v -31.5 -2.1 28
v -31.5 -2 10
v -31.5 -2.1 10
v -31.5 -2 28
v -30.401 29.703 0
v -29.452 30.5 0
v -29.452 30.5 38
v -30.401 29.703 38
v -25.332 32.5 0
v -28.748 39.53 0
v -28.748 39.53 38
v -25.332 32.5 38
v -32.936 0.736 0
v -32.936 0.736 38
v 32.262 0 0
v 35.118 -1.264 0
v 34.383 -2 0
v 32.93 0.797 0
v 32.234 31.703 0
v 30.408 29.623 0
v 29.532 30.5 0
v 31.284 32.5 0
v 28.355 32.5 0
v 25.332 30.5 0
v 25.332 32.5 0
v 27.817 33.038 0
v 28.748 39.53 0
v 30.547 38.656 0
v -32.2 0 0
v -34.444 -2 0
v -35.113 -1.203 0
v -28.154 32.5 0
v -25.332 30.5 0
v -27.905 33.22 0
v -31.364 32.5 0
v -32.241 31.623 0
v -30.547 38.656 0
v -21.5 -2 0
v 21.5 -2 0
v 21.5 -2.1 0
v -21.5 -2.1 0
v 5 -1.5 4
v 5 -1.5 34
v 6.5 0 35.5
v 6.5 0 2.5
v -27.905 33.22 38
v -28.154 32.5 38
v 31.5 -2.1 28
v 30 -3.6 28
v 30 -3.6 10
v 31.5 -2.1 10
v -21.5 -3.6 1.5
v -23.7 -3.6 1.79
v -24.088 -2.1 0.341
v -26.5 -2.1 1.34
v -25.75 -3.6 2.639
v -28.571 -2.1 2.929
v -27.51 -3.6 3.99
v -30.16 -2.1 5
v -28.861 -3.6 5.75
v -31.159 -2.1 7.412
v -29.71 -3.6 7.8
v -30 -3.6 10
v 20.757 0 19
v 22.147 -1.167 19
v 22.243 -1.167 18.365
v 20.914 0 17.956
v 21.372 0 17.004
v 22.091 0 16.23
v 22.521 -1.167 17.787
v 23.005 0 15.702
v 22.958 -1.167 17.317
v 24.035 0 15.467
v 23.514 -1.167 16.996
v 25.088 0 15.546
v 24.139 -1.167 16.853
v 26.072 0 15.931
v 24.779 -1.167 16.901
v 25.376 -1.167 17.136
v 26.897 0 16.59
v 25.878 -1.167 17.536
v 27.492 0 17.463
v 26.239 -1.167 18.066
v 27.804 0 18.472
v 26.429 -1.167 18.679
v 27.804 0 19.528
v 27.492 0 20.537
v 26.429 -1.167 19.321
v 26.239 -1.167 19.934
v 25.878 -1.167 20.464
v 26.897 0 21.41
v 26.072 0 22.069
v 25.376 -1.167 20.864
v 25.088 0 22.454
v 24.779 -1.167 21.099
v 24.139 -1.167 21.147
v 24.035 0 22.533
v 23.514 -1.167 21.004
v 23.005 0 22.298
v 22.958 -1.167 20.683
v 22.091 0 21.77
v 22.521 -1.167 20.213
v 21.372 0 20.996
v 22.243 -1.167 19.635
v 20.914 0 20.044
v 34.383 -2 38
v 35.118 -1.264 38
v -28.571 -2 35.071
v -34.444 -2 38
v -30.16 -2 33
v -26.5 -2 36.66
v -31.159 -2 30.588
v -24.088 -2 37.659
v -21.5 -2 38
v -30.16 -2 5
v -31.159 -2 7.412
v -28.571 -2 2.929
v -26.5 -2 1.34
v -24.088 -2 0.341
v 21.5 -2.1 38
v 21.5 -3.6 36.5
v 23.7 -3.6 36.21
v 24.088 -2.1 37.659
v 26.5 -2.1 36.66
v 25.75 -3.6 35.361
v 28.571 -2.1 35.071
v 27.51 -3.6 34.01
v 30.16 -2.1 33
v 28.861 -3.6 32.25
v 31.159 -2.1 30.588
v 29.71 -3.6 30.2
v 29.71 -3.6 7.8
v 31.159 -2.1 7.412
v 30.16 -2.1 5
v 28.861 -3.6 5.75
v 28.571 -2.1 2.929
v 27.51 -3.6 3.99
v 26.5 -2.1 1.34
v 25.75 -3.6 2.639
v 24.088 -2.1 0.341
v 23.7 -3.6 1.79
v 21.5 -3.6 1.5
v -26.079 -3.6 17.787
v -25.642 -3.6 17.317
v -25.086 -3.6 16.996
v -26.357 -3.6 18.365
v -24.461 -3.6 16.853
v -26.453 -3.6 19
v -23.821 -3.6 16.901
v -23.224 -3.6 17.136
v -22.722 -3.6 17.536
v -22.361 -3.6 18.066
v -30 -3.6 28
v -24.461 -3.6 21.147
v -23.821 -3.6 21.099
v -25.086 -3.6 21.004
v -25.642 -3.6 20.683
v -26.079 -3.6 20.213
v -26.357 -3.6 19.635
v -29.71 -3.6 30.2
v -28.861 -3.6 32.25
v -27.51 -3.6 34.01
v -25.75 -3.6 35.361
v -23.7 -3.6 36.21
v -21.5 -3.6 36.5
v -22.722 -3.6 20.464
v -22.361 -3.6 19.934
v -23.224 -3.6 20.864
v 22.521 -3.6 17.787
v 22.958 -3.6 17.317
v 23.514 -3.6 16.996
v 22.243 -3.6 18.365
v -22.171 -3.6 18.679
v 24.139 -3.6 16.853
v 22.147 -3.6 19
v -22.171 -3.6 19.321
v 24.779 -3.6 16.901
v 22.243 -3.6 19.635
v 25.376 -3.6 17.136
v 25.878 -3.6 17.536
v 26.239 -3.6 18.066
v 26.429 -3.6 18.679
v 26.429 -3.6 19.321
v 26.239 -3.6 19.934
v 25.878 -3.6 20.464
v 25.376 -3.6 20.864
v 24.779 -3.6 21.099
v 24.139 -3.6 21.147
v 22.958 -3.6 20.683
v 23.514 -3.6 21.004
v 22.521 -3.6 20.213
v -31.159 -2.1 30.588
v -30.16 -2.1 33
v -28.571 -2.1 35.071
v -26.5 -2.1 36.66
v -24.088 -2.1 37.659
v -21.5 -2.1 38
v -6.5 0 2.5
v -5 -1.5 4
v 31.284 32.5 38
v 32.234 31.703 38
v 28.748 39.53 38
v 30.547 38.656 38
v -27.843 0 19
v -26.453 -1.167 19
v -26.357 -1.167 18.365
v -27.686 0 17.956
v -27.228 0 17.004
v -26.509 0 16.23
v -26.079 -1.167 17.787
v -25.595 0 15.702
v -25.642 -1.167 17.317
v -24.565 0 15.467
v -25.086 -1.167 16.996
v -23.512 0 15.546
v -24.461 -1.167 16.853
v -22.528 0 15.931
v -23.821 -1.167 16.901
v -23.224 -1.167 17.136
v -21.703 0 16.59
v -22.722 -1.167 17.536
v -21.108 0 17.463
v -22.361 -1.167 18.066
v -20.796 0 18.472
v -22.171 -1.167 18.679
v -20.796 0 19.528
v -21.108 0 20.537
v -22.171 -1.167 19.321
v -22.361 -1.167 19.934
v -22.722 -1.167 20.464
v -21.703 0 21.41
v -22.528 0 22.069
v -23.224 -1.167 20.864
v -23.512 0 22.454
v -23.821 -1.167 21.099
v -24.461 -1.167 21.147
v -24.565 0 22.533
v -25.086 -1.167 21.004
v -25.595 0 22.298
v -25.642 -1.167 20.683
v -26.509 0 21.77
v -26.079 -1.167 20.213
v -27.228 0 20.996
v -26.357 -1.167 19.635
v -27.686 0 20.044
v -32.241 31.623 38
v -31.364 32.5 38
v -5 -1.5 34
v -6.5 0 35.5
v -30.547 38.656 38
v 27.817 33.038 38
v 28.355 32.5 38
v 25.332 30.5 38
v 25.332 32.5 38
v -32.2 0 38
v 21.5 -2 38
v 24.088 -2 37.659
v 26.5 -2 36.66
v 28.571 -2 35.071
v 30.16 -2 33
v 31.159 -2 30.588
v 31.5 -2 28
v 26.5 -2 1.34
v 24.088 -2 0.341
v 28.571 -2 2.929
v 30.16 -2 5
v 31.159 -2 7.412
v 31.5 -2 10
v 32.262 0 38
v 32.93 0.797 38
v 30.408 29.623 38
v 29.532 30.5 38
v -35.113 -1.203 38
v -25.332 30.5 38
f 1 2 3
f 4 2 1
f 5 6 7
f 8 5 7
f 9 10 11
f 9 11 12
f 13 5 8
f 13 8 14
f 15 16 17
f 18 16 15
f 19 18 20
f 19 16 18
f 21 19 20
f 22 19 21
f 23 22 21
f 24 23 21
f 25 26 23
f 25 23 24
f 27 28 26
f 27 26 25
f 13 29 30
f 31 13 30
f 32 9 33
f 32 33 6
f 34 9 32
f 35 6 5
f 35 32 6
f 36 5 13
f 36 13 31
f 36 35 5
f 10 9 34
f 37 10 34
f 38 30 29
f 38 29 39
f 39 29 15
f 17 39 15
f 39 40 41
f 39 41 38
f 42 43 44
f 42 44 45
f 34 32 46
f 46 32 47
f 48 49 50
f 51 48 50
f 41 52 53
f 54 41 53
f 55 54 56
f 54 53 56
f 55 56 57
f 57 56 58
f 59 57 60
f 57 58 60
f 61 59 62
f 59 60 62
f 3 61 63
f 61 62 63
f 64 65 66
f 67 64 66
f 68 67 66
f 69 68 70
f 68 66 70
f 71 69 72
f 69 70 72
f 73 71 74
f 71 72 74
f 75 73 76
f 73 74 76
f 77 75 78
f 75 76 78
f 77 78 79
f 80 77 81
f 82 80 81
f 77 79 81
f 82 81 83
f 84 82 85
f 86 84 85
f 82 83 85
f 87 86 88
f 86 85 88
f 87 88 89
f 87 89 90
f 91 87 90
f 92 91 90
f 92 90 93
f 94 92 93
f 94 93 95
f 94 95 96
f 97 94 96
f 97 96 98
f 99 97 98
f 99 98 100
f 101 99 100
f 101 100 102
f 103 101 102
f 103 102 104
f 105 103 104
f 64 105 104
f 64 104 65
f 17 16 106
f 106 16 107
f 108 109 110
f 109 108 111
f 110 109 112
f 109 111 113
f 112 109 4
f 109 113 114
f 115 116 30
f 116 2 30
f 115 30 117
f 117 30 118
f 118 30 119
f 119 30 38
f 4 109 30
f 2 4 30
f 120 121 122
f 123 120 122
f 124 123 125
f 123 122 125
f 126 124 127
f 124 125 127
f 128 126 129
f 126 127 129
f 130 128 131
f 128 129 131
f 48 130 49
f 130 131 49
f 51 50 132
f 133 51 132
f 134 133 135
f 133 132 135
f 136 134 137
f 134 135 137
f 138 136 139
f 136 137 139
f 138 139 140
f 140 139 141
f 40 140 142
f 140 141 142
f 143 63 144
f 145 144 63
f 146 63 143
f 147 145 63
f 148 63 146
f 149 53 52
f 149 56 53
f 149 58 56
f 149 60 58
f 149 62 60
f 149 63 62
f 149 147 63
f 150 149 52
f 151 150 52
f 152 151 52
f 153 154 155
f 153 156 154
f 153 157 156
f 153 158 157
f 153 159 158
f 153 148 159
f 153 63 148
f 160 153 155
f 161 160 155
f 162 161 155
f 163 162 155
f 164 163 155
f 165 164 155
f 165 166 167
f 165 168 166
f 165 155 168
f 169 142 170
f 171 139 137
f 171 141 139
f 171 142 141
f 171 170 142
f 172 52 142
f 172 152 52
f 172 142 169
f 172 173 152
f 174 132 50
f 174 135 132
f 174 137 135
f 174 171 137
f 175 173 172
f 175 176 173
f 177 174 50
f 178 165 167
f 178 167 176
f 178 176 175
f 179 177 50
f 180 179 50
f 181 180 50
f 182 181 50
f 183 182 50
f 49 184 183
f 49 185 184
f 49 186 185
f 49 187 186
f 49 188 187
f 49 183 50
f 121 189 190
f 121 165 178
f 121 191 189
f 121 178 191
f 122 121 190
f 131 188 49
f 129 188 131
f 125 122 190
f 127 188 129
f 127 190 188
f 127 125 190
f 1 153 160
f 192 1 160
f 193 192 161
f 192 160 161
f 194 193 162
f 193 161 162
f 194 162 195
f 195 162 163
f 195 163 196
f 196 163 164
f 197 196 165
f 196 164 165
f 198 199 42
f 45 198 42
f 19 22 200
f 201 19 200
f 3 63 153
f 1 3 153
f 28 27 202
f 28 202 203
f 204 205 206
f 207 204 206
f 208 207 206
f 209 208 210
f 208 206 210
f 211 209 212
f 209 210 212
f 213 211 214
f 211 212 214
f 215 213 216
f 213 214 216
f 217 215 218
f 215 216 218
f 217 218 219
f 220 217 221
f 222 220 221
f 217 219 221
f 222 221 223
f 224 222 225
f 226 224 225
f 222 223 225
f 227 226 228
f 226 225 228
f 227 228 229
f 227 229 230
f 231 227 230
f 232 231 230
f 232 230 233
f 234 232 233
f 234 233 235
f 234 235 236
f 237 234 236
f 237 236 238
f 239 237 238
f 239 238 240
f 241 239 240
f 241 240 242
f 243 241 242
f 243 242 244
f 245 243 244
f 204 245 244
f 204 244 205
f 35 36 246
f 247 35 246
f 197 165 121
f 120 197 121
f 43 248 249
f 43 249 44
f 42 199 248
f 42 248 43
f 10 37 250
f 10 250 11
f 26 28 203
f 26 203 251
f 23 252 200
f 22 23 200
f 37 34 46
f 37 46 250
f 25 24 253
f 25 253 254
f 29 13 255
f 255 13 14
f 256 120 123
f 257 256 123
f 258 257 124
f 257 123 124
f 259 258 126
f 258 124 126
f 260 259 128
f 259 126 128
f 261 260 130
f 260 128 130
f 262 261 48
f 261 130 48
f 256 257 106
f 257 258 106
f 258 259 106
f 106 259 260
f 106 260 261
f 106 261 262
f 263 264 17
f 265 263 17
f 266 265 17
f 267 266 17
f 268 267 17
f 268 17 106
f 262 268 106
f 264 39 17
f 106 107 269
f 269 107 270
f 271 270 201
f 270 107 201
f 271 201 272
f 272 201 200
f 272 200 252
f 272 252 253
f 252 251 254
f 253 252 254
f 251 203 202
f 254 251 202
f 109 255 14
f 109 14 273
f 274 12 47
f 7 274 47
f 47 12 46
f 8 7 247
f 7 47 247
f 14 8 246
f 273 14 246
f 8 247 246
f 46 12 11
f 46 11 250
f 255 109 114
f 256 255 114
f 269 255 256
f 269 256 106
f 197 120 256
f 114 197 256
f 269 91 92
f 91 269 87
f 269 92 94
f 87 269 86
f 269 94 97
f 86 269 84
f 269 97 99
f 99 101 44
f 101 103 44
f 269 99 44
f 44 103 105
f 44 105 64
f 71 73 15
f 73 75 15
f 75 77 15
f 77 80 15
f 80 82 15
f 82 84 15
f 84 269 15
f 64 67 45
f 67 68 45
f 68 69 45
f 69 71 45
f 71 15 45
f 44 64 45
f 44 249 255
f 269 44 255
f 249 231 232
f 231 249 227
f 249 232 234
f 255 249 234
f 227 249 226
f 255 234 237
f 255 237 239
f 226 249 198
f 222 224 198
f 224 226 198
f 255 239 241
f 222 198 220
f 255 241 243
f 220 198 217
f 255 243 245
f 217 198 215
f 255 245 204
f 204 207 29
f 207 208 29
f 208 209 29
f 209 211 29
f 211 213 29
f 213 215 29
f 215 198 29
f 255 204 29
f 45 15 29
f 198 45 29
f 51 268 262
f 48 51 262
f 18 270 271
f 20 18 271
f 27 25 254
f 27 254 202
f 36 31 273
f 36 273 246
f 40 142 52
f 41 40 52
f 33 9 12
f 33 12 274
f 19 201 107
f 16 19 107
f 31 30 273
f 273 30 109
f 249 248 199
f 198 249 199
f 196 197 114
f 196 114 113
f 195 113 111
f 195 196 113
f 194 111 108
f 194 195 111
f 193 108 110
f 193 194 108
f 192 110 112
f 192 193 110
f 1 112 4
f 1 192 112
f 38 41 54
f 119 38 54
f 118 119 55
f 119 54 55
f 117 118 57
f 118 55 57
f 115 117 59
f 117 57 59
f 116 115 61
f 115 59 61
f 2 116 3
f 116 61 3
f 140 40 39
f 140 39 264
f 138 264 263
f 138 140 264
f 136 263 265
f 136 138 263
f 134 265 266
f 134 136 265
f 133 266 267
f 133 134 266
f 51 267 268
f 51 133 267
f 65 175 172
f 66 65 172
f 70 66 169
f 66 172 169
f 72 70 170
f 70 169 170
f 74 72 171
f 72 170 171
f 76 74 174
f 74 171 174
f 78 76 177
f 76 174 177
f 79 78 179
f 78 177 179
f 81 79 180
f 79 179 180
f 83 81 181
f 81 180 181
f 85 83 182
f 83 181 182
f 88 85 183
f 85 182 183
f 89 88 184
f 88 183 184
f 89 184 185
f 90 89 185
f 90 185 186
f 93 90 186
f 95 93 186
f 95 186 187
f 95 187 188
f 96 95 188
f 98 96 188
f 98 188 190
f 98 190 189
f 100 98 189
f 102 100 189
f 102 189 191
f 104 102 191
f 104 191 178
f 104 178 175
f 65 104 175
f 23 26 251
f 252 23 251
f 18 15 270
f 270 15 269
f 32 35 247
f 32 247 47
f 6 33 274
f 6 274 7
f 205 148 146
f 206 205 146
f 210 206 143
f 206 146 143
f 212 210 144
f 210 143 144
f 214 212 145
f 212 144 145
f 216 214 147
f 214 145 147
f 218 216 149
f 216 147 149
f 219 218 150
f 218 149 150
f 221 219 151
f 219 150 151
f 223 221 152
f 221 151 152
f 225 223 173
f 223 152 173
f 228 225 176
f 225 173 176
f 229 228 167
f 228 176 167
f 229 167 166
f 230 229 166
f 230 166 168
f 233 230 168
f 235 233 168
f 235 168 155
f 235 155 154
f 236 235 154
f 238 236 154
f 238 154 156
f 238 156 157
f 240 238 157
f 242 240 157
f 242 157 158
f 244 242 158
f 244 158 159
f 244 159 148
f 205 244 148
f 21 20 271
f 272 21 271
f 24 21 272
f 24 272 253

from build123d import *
from OCP.BRepFilletAPI import BRepFilletAPI_MakeChamfer

# Parameters (mm, degrees)
BOSS_EXTRUDE1_DEPTH                               = 38
SKETCH5_W                                         = 63
SKETCH5_H                                         = 38
BOSS_EXTRUDE2_DEPTH                               = 1.6
SKETCH9_W                                         = 10
SKETCH9_H                                         = 30
CUT_EXTRUDE4_DEPTH                                = 1.5
CHAMFER4_SIZE                                     = 1.5
CHAMFER6_SIZE                                     = 0.8
CHAMFER6_SIZE2                                    = 0.738449877
CHAMFER7_SIZE                                     = 0.8
CHAMFER7_SIZE2                                    = 0.880050294
CHAMFER7_SIZE2_2                                  = 0.59857957
CSK_FOR_6_FLAT_HEAD_MACHINE_SCREW_100_D           = 4.3053
CSK_FOR_6_FLAT_HEAD_MACHINE_SCREW_100_DEPTH       = 3.6
CSK_FOR_6_FLAT_HEAD_MACHINE_SCREW_100_CSINK_D     = 7.0866
CSK_FOR_6_FLAT_HEAD_MACHINE_SCREW_100_CSINK_ANGLE = 100
FILLET1_R                                         = 10
CHAMFER10_SIZE                                    = 1.5


with BuildPart() as part:
    # Sketch1 → Boss-Extrude1 (new body)
    with BuildSketch(Plane.XY):
        Polygon((-32.16425811, 32.5), (-27.555232111, 32.5), (-30.546782223, 38.65618727), (-28.747926936, 39.530326652), (-25.331595762, 32.5), (-25.331595762, 30.5), (-30.331595762, 30.5), (-33, 0), (0, 0), (33, 0), (30.331595762, 30.5), (25.331595762, 30.5), (25.331595762, 32.5), (28.747926936, 39.530326652), (30.546782223, 38.65618727), (27.555232111, 32.5), (32.16425811, 32.5), (35.182617002, -2), (0, -2), (-35.182617002, -2), align=None)
    extrude(amount=BOSS_EXTRUDE1_DEPTH)

    # Sketch5 → Boss-Extrude2 (add)
    with BuildSketch(Plane.XZ.offset(2)):
        with Locations((0, 19)):
            Rectangle(SKETCH5_W, SKETCH5_H)
    extrude(amount=BOSS_EXTRUDE2_DEPTH)

    # Sketch9 → Cut-Extrude4 (cut)
    with BuildSketch(Plane(origin=(0, 0, 0), x_dir=(1, 0, 0), z_dir=(0, 1, 0))):
        with Locations((0, -19)):
            Rectangle(SKETCH9_W, SKETCH9_H)
    extrude(amount=-CUT_EXTRUDE4_DEPTH, mode=Mode.SUBTRACT)

    # Chamfer4
    chamfer4_edges = [part.edges().sort_by_distance(p)[0] for p in [
        (0, 0, 34),
        (-5, 0, 19),
        (0, 0, 4),
        (5, 0, 19),
    ]]
    chamfer(chamfer4_edges, length=CHAMFER4_SIZE - 0.0001)  # a hair under: the kernel refuses the full size

    # Chamfer6: one chamfer whose edges measure the first distance from different faces: ONE call of the kernel's chamfer builder (chamfer() names one face for all edges)
    chamfer6_edges_1 = [part.edges().sort_by_distance(p)[0] for p in [
        (-33, 0, 19),
    ]]
    chamfer6_side_1 = [part.faces().sort_by_distance(p)[0] for p in [
        (0, 0, 36.261477311),
    ]]
    chamfer6_edges_2 = [part.edges().sort_by_distance(p)[0] for p in [
        (33, 0, 19),
    ]]
    chamfer6_side_2 = [part.faces().sort_by_distance(p)[0] for p in [
        (31.665797881, 15.25, 19),
    ]]
    chamfer6_edges_3 = [part.edges().sort_by_distance(p)[0] for p in [
        (35.182617002, -2, 19),
    ]]
    chamfer6_side_3 = [part.faces().sort_by_distance(p)[0] for p in [
        (33.341308501, -2, 19),
    ]]
    chamfer6_edges_4 = [part.edges().sort_by_distance(p)[0] for p in [
        (-35.182617002, -2, 19),
    ]]
    chamfer6_side_4 = [part.faces().sort_by_distance(p)[0] for p in [
        (-33.673437556, 15.25, 19),
    ]]
    chamfer6 = BRepFilletAPI_MakeChamfer(part.part.solid().wrapped)
    for e in chamfer6_edges_1:
        chamfer6.Add(CHAMFER6_SIZE, CHAMFER6_SIZE2, e.wrapped, chamfer6_side_1[0].wrapped)  # the first distance lies on this face
    for e in chamfer6_edges_2:
        chamfer6.Add(CHAMFER6_SIZE, CHAMFER6_SIZE2, e.wrapped, chamfer6_side_2[0].wrapped)  # the first distance lies on this face
    for e in chamfer6_edges_3:
        chamfer6.Add(CHAMFER6_SIZE, CHAMFER6_SIZE2, e.wrapped, chamfer6_side_3[0].wrapped)  # the first distance lies on this face
    for e in chamfer6_edges_4:
        chamfer6.Add(CHAMFER6_SIZE, CHAMFER6_SIZE2, e.wrapped, chamfer6_side_4[0].wrapped)  # the first distance lies on this face
    add(Compound.cast(chamfer6.Shape()), mode=Mode.REPLACE)

    # Chamfer7: one chamfer whose edges measure the first distance from different faces: ONE call of the kernel's chamfer builder (chamfer() names one face for all edges)
    chamfer7_edges_1 = [part.edges().sort_by_distance(p)[0] for p in [
        (-30.331595762, 30.5, 19),
    ]]
    chamfer7_side_1 = [part.faces().sort_by_distance(p)[0] for p in [
        (-31.633617807, 15.617819926, 19),
    ]]
    chamfer7_edges_2 = [part.edges().sort_by_distance(p)[0] for p in [
        (30.331595762, 30.5, 19),
    ]]
    chamfer7_side_2 = [part.faces().sort_by_distance(p)[0] for p in [
        (27.831595762, 30.5, 19),
    ]]
    chamfer7_edges_3 = [part.edges().sort_by_distance(p)[0] for p in [
        (27.555232111, 32.5, 19),
    ]]
    chamfer7_side_3 = [part.faces().sort_by_distance(p)[0] for p in [
        (29.859745111, 32.5, 19),
    ]]
    chamfer7_edges_4 = [part.edges().sort_by_distance(p)[0] for p in [
        (32.16425811, 32.5, 19),
    ]]
    chamfer7_side_4 = [part.faces().sort_by_distance(p)[0] for p in [
        (33.641257483, 15.617819926, 19),
    ]]
    chamfer7_edges_5 = [part.edges().sort_by_distance(p)[0] for p in [
        (-32.16425811, 32.5, 19),
    ]]
    chamfer7_side_5 = [part.faces().sort_by_distance(p)[0] for p in [
        (-29.859745111, 32.5, 19),
    ]]
    chamfer7_edges_6 = [part.edges().sort_by_distance(p)[0] for p in [
        (-27.555232111, 32.5, 19),
    ]]
    chamfer7_side_6 = [part.faces().sort_by_distance(p)[0] for p in [
        (-29.051007167, 35.578093635, 19),
    ]]
    chamfer7 = BRepFilletAPI_MakeChamfer(part.part.solid().wrapped)
    for e in chamfer7_edges_1:
        chamfer7.Add(CHAMFER7_SIZE, CHAMFER7_SIZE2, e.wrapped, chamfer7_side_1[0].wrapped)  # the first distance lies on this face
    for e in chamfer7_edges_2:
        chamfer7.Add(CHAMFER7_SIZE, CHAMFER7_SIZE2, e.wrapped, chamfer7_side_2[0].wrapped)  # the first distance lies on this face
    for e in chamfer7_edges_3:
        chamfer7.Add(CHAMFER7_SIZE, CHAMFER7_SIZE2_2, e.wrapped, chamfer7_side_3[0].wrapped)  # the first distance lies on this face
    for e in chamfer7_edges_4:
        chamfer7.Add(CHAMFER7_SIZE, CHAMFER7_SIZE2, e.wrapped, chamfer7_side_4[0].wrapped)  # the first distance lies on this face
    for e in chamfer7_edges_5:
        chamfer7.Add(CHAMFER7_SIZE, CHAMFER7_SIZE2, e.wrapped, chamfer7_side_5[0].wrapped)  # the first distance lies on this face
    for e in chamfer7_edges_6:
        chamfer7.Add(CHAMFER7_SIZE, CHAMFER7_SIZE2_2, e.wrapped, chamfer7_side_6[0].wrapped)  # the first distance lies on this face
    add(Compound.cast(chamfer7.Shape()), mode=Mode.REPLACE)

    # CSK for #6 Flat Head Machine Screw (100)1
    with Locations(Plane(origin=(0, 0, 0), x_dir=(1, 0, 0), z_dir=(0, 1, 0))):
        with Locations((24.3, -19), (-24.3, -19)):
            CounterSinkHole(CSK_FOR_6_FLAT_HEAD_MACHINE_SCREW_100_D / 2, CSK_FOR_6_FLAT_HEAD_MACHINE_SCREW_100_CSINK_D / 2, depth=CSK_FOR_6_FLAT_HEAD_MACHINE_SCREW_100_DEPTH, counter_sink_angle=CSK_FOR_6_FLAT_HEAD_MACHINE_SCREW_100_CSINK_ANGLE)

    # Fillet1
    fillet1_edges = [part.edges().sort_by_distance(p)[0] for p in [
        (-31.5, -2.8, 0),
        (31.5, -2.8, 0),
        (31.5, -2.8, 38),
        (-31.5, -2.8, 38),
    ]]
    fillet(fillet1_edges, radius=FILLET1_R)

    # Chamfer10
    chamfer10_edges = [part.edges().sort_by_distance(p)[0] for p in [
        (-31.5, -3.6, 19),
        (0, -3.6, 38),
        (0, -3.6, 0),
        (31.5, -3.6, 19),
        (28.571067812, -3.6, 35.071067812),
        (28.571067812, -3.6, 2.928932188),
        (-28.571067812, -3.6, 2.928932188),
        (-28.571067812, -3.6, 35.071067812),
    ]]
    chamfer(chamfer10_edges, length=CHAMFER10_SIZE)


solid = part.part
